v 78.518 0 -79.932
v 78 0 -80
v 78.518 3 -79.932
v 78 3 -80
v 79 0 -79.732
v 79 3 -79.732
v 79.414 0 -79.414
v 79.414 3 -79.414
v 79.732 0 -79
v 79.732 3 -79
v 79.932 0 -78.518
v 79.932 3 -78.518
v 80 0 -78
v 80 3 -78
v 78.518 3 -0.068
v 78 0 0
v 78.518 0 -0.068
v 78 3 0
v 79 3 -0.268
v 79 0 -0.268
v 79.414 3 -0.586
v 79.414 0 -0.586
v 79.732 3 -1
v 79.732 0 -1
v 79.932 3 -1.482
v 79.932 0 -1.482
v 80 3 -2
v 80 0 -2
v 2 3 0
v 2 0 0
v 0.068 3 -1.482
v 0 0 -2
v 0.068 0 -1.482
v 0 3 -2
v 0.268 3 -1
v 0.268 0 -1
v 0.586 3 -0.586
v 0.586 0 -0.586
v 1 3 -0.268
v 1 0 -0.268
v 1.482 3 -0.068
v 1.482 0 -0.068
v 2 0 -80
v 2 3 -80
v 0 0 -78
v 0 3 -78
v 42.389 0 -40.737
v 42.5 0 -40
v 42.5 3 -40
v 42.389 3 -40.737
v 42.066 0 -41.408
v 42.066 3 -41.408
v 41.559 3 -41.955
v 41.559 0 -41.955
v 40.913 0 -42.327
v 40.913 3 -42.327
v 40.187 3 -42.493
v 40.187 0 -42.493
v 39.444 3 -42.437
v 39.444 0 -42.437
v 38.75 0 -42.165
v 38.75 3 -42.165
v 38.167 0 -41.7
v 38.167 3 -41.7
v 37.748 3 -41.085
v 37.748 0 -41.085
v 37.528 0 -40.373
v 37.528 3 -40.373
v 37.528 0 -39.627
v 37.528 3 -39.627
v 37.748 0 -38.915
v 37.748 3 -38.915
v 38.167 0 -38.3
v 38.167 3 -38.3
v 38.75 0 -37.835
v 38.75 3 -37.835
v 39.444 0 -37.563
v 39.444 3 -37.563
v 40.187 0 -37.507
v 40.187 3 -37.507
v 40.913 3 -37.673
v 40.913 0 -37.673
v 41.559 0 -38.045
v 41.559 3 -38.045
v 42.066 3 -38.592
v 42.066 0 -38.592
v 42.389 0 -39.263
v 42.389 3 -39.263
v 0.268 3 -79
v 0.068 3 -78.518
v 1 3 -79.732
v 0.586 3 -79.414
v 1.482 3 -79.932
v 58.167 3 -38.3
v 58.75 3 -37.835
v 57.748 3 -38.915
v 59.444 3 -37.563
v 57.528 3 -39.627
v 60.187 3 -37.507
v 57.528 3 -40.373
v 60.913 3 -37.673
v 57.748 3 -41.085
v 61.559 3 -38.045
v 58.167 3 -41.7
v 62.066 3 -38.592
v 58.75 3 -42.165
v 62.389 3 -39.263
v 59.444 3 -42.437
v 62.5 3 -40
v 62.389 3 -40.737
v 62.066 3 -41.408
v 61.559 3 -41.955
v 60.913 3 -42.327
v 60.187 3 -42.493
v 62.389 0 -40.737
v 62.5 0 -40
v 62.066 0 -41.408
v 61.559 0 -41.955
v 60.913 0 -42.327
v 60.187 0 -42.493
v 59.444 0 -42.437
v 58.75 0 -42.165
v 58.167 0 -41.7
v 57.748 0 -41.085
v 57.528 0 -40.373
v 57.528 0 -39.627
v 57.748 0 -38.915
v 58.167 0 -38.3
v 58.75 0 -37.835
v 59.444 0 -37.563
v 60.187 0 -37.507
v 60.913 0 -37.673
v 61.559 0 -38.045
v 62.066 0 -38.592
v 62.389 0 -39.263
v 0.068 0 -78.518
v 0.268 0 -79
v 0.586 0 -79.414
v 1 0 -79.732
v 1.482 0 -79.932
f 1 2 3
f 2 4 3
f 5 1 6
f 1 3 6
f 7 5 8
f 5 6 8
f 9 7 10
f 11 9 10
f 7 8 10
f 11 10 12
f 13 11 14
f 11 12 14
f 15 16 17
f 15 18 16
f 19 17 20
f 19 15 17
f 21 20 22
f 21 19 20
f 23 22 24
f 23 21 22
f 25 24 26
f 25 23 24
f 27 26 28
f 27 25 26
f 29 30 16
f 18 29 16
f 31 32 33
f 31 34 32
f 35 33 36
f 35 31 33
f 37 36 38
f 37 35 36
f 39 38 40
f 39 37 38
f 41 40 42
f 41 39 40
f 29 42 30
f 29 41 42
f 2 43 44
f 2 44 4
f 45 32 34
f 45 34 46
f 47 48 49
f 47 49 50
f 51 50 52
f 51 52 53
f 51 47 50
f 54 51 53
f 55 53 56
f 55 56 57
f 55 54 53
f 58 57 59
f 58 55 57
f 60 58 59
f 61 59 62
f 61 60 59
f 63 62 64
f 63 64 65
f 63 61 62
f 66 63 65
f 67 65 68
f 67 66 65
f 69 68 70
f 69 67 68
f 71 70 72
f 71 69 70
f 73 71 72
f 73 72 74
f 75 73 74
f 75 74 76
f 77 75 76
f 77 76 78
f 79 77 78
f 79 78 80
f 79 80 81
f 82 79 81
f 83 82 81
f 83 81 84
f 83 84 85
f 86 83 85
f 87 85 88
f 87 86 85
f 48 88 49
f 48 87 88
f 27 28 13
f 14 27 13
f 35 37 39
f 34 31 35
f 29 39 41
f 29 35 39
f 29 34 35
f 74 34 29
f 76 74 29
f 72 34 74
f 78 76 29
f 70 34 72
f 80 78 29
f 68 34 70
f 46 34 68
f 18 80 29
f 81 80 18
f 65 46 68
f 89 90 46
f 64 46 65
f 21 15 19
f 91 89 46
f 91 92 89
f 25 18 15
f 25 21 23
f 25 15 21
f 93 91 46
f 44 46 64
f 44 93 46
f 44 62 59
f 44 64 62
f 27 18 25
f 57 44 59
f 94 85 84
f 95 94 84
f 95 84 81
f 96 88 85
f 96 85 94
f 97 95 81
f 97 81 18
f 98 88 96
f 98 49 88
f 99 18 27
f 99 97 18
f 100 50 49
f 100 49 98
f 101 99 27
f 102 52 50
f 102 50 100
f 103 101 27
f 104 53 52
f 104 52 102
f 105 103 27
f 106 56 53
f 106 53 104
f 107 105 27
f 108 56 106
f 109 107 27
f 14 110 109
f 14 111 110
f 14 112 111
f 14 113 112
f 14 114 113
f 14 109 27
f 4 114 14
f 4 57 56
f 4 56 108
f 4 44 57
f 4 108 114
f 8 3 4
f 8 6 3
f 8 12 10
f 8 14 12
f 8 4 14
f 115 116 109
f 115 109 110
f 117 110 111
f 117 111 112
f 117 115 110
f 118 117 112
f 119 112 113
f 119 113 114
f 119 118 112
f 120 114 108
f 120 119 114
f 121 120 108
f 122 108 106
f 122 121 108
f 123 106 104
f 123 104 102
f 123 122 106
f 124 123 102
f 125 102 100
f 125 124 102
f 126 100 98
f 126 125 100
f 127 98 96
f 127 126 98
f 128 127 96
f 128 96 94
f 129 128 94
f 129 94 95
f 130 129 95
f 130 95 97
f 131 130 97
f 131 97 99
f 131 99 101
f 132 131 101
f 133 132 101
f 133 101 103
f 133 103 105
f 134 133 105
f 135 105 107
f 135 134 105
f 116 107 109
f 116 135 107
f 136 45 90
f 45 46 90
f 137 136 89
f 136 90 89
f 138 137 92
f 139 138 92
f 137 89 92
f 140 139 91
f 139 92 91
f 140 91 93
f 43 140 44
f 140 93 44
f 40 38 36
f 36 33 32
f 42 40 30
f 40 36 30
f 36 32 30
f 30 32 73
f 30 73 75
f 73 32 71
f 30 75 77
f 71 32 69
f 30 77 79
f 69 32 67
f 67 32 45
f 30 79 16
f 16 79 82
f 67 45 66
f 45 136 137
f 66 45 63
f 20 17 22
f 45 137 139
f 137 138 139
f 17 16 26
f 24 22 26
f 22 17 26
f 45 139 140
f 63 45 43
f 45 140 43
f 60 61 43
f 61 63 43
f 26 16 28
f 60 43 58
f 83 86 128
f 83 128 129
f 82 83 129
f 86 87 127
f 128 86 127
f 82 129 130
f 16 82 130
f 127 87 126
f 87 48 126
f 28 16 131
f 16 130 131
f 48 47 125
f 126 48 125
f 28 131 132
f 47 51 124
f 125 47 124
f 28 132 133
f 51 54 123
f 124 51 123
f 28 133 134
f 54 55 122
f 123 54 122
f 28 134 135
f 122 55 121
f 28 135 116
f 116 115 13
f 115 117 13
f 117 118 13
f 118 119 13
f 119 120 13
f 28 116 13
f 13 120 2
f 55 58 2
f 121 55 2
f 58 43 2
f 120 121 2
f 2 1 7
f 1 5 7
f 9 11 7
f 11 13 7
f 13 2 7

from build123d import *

# Parameters (mm, degrees)
ESQUISSE1_W      = 80
ESQUISSE1_H      = 80
ESQUISSE1_R      = 2.5
EXTRUSION1_DEPTH = 3
CONG_1_R         = 2


with BuildPart() as part:
    # Esquisse1 → Extrusion1 (new body)
    with BuildSketch(Plane(origin=(0, 0, 0), x_dir=(1, 0, 0), z_dir=(0, 1, 0))):
        with Locations((40, 40)):
            Rectangle(ESQUISSE1_W, ESQUISSE1_H)
        with Locations((40, 40)):
            Circle(ESQUISSE1_R, mode=Mode.SUBTRACT)
        with Locations((60, 40)):
            Circle(ESQUISSE1_R, mode=Mode.SUBTRACT)
    extrude(amount=EXTRUSION1_DEPTH)

    # Congé1
    cong_1_edges = [part.edges().sort_by_distance(p)[0] for p in [
        (0, 1.5, -80),
        (80, 1.5, -80),
        (80, 1.5, 0),
        (0, 1.5, 0),
    ]]
    fillet(cong_1_edges, radius=CONG_1_R)


solid = part.part
